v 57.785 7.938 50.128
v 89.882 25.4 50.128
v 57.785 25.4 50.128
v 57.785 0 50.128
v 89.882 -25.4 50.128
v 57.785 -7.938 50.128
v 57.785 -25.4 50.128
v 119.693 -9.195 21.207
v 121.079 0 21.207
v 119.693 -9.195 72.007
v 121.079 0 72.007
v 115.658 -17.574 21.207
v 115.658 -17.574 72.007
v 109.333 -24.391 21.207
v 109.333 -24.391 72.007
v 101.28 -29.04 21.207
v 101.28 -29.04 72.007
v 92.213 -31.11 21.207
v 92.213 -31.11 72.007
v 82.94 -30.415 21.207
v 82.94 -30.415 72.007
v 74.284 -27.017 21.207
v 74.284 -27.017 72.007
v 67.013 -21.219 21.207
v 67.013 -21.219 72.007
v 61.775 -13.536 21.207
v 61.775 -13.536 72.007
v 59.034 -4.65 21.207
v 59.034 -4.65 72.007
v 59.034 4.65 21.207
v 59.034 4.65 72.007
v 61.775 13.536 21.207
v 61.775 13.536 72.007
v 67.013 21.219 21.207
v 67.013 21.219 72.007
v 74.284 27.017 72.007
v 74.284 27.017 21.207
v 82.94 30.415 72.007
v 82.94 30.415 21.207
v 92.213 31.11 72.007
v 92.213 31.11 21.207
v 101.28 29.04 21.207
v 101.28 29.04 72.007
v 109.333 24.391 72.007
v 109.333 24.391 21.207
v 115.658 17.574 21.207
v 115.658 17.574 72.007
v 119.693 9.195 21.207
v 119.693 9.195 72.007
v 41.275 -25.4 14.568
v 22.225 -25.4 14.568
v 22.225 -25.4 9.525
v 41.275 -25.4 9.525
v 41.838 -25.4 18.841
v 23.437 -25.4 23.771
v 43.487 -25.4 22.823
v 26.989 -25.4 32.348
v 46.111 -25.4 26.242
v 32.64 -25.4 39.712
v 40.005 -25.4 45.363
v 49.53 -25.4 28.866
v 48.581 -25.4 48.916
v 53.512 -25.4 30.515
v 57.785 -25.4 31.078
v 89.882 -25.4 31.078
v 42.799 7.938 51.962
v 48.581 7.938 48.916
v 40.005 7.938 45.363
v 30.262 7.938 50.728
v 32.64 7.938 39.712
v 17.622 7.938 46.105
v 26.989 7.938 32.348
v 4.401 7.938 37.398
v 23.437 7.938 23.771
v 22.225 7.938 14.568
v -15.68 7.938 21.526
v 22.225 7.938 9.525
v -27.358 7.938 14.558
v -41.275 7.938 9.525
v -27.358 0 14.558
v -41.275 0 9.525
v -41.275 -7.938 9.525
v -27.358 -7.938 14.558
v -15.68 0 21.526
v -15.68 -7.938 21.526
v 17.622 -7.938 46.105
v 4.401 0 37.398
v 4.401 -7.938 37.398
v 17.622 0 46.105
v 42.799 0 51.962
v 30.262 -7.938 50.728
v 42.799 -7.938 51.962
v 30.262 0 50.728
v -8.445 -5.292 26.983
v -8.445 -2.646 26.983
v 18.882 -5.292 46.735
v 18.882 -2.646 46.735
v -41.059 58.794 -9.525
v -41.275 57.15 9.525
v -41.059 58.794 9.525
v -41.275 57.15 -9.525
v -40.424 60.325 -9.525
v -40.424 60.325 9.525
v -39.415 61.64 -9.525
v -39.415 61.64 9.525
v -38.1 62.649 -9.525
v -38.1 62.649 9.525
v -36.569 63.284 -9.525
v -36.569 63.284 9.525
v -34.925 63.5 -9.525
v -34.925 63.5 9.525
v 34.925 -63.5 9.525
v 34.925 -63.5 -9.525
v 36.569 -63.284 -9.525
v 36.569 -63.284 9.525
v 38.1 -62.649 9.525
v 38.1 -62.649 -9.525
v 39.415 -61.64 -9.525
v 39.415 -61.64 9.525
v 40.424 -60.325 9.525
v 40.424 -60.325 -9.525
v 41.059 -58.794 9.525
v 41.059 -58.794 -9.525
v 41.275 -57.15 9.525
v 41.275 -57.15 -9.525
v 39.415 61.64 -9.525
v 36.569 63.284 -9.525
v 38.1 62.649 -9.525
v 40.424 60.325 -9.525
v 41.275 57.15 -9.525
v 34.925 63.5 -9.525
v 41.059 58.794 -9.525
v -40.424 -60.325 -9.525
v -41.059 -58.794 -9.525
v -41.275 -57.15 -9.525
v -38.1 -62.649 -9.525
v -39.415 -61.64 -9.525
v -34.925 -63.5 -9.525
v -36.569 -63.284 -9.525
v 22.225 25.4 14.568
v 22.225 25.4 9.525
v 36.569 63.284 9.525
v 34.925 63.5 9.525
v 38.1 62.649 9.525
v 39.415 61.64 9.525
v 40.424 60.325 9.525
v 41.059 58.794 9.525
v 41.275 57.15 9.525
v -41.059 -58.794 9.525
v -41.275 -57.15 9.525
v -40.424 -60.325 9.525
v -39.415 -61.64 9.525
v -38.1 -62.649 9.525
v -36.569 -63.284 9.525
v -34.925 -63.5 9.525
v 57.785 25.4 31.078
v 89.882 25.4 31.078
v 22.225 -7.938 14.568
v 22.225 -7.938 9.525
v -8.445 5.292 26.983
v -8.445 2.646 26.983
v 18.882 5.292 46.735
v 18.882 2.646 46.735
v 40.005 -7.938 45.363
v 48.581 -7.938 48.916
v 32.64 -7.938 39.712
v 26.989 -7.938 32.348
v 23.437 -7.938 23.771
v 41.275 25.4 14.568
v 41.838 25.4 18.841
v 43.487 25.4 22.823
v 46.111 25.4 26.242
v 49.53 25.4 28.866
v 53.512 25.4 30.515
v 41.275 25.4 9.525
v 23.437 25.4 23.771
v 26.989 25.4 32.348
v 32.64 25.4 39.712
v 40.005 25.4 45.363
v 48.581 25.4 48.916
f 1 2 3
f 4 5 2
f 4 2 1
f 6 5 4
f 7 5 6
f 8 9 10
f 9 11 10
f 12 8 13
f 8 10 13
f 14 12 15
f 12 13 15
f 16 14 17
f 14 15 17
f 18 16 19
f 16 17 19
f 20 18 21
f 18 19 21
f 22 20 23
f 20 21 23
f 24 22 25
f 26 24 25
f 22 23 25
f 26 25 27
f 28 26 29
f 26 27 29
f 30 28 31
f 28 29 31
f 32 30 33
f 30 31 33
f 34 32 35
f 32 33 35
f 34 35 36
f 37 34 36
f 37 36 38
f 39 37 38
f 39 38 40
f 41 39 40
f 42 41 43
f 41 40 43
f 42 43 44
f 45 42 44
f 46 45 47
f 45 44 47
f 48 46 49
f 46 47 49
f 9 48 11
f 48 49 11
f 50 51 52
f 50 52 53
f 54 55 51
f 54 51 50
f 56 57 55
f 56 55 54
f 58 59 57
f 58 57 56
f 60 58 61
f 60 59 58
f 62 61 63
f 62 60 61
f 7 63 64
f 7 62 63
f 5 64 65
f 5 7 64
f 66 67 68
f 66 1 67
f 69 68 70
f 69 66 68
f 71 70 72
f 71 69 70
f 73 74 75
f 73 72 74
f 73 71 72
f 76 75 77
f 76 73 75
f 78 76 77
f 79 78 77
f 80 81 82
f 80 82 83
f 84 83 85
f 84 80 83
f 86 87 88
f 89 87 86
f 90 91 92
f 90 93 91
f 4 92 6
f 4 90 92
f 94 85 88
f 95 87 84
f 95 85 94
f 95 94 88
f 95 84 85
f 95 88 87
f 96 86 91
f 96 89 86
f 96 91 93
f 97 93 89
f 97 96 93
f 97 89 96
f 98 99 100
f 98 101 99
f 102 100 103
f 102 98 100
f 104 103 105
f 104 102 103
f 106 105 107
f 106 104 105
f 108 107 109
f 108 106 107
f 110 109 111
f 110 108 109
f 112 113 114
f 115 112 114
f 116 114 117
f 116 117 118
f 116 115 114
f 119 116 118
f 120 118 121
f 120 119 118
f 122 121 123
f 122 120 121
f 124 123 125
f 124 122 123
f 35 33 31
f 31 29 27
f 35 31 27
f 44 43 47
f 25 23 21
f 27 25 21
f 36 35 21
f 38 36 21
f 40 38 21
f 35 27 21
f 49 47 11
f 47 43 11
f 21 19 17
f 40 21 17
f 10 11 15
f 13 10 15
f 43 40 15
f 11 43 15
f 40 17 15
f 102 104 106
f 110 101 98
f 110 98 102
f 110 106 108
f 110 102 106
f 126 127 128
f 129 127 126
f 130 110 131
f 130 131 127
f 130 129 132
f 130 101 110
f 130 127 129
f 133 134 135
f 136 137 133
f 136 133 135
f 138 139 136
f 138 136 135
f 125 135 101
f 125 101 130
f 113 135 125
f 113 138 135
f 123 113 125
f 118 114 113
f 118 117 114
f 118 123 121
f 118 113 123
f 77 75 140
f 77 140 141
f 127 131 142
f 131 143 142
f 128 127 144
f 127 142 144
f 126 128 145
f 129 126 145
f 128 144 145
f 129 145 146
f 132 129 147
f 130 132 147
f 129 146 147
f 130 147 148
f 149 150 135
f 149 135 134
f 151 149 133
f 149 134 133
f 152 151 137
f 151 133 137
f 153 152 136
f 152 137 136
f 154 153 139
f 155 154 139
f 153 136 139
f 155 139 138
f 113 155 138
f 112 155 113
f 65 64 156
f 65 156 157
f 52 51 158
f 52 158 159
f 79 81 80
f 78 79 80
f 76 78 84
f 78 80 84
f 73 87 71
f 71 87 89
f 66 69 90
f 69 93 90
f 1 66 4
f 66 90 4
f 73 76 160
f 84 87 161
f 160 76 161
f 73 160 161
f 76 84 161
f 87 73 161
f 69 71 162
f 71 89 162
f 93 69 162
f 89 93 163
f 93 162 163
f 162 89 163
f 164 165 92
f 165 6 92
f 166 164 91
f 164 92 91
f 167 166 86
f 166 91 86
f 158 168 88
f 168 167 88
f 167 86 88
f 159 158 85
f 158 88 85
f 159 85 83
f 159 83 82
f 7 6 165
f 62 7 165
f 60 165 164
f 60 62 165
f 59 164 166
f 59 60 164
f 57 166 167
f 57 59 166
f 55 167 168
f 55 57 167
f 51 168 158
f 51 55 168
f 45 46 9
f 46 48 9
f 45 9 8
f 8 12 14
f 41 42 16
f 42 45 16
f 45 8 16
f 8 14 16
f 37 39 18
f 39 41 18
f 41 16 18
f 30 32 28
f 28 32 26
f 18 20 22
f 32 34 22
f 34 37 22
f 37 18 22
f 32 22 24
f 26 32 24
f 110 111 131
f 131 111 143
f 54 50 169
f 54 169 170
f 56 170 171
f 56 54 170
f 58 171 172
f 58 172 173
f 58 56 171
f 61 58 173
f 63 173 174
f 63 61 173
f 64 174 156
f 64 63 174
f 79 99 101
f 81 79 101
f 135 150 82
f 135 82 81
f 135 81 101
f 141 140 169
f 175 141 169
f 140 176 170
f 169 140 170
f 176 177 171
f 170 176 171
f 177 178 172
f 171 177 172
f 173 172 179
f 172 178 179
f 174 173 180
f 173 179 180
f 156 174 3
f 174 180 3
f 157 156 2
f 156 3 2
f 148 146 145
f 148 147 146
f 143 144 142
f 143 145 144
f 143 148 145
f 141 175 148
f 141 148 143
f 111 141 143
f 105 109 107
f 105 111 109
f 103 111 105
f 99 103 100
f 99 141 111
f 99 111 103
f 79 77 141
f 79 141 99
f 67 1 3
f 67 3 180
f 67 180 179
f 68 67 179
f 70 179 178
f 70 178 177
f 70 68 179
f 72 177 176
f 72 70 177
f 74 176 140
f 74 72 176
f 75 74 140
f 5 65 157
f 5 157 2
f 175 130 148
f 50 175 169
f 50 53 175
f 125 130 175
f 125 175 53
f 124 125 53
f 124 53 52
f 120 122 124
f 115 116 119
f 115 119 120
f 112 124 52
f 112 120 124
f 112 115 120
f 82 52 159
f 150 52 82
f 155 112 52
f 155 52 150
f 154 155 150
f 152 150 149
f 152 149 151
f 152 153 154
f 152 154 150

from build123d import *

# Parameters (mm, degrees)
F1_DEPTH = 63.5
F0_W     = 19.6030134281
F0_H     = 19.05
F2_DEPTH = 25.4
F3_DEPTH = 7.9375
F5_R     = 6.35


with BuildPart() as f1:
    # F0 (on Front) → F1 (new body, symmetric)
    with BuildSketch(Plane.XZ):
        Polygon((22.225, 9.525), (-41.275, 9.525), (-41.275, -9.525), (41.275, -9.525), (41.275, 9.525), align=None)
    extrude(amount=F1_DEPTH, both=True)

    # F0 (on Front) → F2 (join, symmetric)
    with BuildSketch(Plane.XZ):
        with BuildLine():
            Line((22.225, 14.5675246471), (22.225, 9.525))
            Line((22.225, 9.525), (41.275, 9.525))
            Line((41.275, 9.525), (41.275, 14.5675246471))
            ThreePointArc((41.275, 14.5675246471), (46.1106670426, 26.2418576045), (57.785, 31.0775246471))
            Line((57.785, 31.0775246471), (70.2790474574, 31.0775246471))
            Line((70.2790474574, 31.0775246471), (70.2790474574, 50.1275246471))
            Line((70.2790474574, 50.1275246471), (57.785, 50.1275246471))
            ThreePointArc((57.785, 50.1275246471), (32.640282861, 39.7122417861), (22.225, 14.5675246471))
        make_face()
        with Locations((80.0805541714, 40.6025246471)):
            Rectangle(F0_W, F0_H)
    extrude(amount=F2_DEPTH, both=True)

    # F0 (on Front) → F3 (join, symmetric)
    with BuildSketch(Plane.XZ):
        with BuildLine():
            add(Edge.make_bspline(
                [(-41.275, 9.525), (0, 19.6168608963), (7.4018002488, 61.1333376465), (57.785, 50.1275246471)],
                knots=[0, 0, 0, 0, 107.0581552602, 107.0581552602, 107.0581552602, 107.0581552602], degree=3))
            Line((-41.275, 9.525), (22.225, 9.525))
            Line((22.225, 9.525), (22.225, 14.5675246471))
            ThreePointArc((22.225, 14.5675246471), (32.640282861, 39.7122417861), (57.785, 50.1275246471))
        make_face()
    extrude(amount=F3_DEPTH, both=True)

    # F5
    f5_edges = [f1.edges().sort_by_distance(p)[0] for p in [
        (41.275, -63.5, 0),
        (-41.275, -63.5, 0),
        (41.275, 63.5, 0),
        (-41.275, 63.5, 0),
    ]]
    fillet(f5_edges, radius=F5_R)


with BuildPart() as f4:
    # F0 (on Front) → F4 (revolve)
    with BuildSketch(Plane.XZ):
        Polygon((89.8820608854, 72.0070831388), (89.8820608854, 50.1275246471), (89.8820608854, 31.0775246471), (89.8820608854, 21.2070831388), (121.0790474574, 21.2070831388), (121.0790474574, 72.0070831388), align=None)
    revolve(axis=Axis((89.8820608854, 0, 46.6070831388), (0, 0, -1)))


solid = Compound([f1.part, f4.part])
